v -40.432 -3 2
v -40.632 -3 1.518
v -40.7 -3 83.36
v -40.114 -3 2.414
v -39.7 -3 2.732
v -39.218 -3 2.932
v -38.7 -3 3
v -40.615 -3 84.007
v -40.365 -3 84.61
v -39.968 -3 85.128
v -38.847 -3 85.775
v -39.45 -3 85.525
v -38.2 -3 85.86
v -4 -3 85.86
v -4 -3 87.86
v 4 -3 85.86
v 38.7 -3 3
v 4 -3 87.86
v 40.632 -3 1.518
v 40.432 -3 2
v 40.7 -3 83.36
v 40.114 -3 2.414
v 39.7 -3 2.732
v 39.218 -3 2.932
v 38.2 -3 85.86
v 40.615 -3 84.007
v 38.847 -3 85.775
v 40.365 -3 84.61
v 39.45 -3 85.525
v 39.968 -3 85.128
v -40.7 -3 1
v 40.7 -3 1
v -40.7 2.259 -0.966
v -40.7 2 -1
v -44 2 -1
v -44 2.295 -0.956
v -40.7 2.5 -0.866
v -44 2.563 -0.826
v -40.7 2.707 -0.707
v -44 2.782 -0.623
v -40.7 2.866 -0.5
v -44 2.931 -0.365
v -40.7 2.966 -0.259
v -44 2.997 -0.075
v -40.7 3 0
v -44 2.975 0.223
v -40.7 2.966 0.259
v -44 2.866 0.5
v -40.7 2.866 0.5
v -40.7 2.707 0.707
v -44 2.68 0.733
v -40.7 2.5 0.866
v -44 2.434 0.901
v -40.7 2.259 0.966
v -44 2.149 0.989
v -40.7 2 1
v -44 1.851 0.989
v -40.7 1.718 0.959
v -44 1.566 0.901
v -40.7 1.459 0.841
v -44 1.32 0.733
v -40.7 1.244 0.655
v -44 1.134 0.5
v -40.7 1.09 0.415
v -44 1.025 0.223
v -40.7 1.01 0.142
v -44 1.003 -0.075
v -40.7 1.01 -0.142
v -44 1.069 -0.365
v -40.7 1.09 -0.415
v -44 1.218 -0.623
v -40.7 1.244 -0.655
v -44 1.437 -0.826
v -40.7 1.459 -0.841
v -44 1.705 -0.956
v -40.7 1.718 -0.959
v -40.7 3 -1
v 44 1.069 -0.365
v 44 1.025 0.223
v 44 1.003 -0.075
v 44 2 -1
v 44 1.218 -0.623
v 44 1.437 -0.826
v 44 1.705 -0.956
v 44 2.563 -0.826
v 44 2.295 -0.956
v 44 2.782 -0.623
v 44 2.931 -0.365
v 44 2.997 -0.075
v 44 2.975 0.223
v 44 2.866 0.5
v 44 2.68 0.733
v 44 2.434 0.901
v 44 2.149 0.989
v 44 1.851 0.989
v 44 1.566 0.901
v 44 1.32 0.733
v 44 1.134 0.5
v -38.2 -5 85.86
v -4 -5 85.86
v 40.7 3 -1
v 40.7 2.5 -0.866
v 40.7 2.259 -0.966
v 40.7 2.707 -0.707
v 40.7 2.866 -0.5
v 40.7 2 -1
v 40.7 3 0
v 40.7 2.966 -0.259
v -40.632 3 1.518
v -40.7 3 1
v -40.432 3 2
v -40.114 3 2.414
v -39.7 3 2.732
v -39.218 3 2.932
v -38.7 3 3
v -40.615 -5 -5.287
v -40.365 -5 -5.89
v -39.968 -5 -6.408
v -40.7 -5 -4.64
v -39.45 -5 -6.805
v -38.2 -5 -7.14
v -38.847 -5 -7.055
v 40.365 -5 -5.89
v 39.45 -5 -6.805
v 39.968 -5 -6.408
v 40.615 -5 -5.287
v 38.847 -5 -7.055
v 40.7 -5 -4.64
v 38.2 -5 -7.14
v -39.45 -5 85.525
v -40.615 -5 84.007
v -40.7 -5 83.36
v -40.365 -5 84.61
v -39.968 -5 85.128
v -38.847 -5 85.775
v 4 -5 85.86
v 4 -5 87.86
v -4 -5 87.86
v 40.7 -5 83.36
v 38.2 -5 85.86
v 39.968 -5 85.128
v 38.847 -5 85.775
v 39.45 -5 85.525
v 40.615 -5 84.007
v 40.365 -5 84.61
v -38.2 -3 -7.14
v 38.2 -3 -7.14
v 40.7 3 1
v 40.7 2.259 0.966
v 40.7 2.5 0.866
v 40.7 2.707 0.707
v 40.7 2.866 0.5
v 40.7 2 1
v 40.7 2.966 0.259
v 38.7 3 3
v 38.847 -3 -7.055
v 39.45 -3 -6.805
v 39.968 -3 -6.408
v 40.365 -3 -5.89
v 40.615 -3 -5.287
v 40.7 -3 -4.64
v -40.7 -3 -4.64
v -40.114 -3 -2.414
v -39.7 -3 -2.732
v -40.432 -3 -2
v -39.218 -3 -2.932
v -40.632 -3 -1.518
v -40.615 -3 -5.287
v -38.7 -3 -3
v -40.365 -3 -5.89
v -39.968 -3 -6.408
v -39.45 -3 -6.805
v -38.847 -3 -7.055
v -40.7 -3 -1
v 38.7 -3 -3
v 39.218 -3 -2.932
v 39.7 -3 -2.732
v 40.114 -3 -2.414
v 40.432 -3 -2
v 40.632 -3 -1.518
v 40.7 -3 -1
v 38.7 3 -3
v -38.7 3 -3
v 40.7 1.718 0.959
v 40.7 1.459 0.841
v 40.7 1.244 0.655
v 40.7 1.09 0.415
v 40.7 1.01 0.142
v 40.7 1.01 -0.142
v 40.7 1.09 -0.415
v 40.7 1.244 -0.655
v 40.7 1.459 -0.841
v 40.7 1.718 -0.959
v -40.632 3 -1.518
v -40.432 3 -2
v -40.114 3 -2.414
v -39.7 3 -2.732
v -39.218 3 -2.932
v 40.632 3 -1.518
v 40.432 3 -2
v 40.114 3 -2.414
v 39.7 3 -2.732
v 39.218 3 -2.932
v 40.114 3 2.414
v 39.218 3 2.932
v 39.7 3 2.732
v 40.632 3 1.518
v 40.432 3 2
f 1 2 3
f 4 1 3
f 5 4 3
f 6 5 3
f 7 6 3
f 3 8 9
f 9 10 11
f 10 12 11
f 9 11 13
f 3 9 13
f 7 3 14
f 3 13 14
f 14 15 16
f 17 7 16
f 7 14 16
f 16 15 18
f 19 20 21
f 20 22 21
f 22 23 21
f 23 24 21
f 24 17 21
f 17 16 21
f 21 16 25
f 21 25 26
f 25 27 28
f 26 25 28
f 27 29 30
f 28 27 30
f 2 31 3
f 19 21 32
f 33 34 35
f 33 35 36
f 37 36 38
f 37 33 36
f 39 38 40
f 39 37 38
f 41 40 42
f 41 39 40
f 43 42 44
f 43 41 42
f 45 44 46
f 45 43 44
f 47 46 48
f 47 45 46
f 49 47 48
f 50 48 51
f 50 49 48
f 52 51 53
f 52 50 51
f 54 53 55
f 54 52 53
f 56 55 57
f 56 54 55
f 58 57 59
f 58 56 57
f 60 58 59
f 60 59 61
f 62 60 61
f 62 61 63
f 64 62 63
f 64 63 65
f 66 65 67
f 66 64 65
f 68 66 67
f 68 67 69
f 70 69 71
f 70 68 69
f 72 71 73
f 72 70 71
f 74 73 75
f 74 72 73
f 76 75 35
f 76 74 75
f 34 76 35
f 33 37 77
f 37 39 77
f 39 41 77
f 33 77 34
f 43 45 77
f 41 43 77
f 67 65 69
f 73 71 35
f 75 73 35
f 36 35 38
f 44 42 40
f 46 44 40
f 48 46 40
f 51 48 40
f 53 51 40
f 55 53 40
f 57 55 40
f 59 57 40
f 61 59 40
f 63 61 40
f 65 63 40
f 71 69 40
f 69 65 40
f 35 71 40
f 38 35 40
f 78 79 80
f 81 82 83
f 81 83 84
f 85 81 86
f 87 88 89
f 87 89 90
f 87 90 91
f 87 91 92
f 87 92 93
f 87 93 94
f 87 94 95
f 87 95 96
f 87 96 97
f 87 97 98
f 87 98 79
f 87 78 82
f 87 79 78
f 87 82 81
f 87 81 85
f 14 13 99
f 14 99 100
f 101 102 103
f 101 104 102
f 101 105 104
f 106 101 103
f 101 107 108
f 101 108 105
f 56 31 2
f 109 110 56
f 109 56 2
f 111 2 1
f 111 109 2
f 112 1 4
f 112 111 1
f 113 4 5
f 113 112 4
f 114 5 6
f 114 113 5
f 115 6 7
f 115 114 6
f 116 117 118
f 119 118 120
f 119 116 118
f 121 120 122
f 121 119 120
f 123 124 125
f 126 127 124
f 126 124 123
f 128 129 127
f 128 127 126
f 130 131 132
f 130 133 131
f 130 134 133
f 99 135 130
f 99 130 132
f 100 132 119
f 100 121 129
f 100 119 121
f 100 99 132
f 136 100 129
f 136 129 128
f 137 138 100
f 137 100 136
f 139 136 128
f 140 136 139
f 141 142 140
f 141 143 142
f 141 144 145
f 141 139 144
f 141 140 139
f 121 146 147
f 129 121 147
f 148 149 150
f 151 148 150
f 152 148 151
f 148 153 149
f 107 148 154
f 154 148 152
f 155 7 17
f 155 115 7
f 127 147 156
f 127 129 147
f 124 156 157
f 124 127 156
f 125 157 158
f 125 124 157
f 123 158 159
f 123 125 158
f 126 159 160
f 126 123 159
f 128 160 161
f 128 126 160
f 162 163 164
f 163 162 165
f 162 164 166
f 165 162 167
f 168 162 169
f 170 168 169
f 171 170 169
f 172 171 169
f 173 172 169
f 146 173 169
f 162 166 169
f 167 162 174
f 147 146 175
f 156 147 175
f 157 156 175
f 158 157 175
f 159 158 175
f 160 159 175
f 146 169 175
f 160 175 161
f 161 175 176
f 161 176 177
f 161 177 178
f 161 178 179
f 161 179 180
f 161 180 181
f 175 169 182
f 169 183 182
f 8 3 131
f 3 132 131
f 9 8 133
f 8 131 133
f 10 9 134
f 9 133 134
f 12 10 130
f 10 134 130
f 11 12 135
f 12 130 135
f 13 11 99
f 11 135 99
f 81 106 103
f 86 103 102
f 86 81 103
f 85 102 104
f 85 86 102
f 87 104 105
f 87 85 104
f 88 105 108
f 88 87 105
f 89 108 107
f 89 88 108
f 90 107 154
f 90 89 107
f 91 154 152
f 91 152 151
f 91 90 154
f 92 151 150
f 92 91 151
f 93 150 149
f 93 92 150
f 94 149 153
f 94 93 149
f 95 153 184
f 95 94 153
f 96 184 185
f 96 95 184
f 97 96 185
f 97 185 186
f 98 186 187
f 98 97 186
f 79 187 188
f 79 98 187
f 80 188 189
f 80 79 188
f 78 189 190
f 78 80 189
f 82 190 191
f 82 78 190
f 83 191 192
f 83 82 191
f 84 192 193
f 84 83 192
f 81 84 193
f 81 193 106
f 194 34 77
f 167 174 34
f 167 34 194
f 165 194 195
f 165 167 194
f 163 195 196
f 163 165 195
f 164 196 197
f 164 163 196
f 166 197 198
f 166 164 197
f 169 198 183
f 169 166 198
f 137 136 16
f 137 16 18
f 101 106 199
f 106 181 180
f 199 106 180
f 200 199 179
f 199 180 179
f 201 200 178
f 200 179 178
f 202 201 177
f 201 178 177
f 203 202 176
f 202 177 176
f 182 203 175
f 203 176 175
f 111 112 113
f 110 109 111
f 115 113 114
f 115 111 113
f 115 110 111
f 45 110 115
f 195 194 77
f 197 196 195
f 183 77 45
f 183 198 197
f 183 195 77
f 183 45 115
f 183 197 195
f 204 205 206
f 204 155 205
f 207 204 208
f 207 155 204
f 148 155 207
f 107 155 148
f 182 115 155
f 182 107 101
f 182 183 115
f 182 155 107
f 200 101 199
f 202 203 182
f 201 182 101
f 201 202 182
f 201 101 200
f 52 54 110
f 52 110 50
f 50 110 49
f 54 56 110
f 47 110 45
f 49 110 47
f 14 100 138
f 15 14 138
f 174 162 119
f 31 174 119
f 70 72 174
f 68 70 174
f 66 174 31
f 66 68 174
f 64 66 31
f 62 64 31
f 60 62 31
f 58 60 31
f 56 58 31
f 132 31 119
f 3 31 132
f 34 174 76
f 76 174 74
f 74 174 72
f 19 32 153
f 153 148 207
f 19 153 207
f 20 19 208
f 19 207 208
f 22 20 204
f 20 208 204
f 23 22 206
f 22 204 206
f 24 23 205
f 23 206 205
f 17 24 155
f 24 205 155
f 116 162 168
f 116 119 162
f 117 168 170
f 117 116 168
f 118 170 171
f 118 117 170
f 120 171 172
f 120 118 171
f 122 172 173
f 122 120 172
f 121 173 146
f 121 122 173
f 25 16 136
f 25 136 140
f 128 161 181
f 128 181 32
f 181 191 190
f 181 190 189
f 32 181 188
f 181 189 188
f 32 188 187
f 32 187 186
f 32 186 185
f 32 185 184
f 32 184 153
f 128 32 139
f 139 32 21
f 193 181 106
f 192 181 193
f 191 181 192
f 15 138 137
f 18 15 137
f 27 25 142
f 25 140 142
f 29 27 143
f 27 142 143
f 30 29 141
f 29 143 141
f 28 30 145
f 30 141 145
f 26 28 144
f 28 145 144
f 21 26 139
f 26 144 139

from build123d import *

# Parameters (mm, degrees)
SKETCH1_W           = 81.4
SKETCH1_H           = 6
BOSS_EXTRUDE1_DEPTH = 3
FILLET1_R           = 2
SKETCH2_R           = 1
BOSS_EXTRUDE2_DEPTH = 44
SKETCH3_W           = 81.4
SKETCH3_H           = 93
BOSS_EXTRUDE3_DEPTH = 2
FILLET2_R           = 2.5
SKETCH4_W           = 8
SKETCH4_H           = 4
BOSS_EXTRUDE4_DEPTH = 2


with BuildPart() as part:
    # Sketch1 → Boss-Extrude1 (new, symmetric)
    with BuildSketch(Plane(origin=(0, 0, 0), x_dir=(1, 0, 0), z_dir=(0, 1, 0))):
        Rectangle(SKETCH1_W, SKETCH1_H)
    extrude(amount=BOSS_EXTRUDE1_DEPTH, both=True)

    # Fillet1
    fillet1_edges = [part.edges().sort_by_distance(p)[0] for p in [
        (-40.7, 0, -3),
        (40.7, 0, -3),
        (40.7, 0, 3),
        (-40.7, 0, 3),
    ]]
    fillet(fillet1_edges, radius=FILLET1_R)

    # Sketch2 → Boss-Extrude2 (add, symmetric)
    with BuildSketch(Plane(origin=(0, 0, 0), x_dir=(0, 0, -1), z_dir=(1, 0, 0))):
        with Locations((0, 2)):
            Circle(SKETCH2_R)
    extrude(amount=BOSS_EXTRUDE2_DEPTH, both=True)

    # Sketch3 → Boss-Extrude3 (add)
    with BuildSketch(Plane.XZ.offset(3)):
        with Locations((0, 39.36)):
            Rectangle(SKETCH3_W, SKETCH3_H)
    extrude(amount=BOSS_EXTRUDE3_DEPTH)

    # Fillet2
    fillet2_edges = [part.edges().sort_by_distance(p)[0] for p in [
        (40.7, -4, -7.14),
        (40.7, -4, 85.86),
        (-40.7, -4, 85.86),
        (-40.7, -4, -7.14),
    ]]
    fillet(fillet2_edges, radius=FILLET2_R)

    # Sketch4 → Boss-Extrude4 (add)
    with BuildSketch(Plane.XZ.offset(5)):
        with Locations((0, 85.86)):
            Rectangle(SKETCH4_W, SKETCH4_H)
    extrude(amount=-BOSS_EXTRUDE4_DEPTH)


solid = part.part
